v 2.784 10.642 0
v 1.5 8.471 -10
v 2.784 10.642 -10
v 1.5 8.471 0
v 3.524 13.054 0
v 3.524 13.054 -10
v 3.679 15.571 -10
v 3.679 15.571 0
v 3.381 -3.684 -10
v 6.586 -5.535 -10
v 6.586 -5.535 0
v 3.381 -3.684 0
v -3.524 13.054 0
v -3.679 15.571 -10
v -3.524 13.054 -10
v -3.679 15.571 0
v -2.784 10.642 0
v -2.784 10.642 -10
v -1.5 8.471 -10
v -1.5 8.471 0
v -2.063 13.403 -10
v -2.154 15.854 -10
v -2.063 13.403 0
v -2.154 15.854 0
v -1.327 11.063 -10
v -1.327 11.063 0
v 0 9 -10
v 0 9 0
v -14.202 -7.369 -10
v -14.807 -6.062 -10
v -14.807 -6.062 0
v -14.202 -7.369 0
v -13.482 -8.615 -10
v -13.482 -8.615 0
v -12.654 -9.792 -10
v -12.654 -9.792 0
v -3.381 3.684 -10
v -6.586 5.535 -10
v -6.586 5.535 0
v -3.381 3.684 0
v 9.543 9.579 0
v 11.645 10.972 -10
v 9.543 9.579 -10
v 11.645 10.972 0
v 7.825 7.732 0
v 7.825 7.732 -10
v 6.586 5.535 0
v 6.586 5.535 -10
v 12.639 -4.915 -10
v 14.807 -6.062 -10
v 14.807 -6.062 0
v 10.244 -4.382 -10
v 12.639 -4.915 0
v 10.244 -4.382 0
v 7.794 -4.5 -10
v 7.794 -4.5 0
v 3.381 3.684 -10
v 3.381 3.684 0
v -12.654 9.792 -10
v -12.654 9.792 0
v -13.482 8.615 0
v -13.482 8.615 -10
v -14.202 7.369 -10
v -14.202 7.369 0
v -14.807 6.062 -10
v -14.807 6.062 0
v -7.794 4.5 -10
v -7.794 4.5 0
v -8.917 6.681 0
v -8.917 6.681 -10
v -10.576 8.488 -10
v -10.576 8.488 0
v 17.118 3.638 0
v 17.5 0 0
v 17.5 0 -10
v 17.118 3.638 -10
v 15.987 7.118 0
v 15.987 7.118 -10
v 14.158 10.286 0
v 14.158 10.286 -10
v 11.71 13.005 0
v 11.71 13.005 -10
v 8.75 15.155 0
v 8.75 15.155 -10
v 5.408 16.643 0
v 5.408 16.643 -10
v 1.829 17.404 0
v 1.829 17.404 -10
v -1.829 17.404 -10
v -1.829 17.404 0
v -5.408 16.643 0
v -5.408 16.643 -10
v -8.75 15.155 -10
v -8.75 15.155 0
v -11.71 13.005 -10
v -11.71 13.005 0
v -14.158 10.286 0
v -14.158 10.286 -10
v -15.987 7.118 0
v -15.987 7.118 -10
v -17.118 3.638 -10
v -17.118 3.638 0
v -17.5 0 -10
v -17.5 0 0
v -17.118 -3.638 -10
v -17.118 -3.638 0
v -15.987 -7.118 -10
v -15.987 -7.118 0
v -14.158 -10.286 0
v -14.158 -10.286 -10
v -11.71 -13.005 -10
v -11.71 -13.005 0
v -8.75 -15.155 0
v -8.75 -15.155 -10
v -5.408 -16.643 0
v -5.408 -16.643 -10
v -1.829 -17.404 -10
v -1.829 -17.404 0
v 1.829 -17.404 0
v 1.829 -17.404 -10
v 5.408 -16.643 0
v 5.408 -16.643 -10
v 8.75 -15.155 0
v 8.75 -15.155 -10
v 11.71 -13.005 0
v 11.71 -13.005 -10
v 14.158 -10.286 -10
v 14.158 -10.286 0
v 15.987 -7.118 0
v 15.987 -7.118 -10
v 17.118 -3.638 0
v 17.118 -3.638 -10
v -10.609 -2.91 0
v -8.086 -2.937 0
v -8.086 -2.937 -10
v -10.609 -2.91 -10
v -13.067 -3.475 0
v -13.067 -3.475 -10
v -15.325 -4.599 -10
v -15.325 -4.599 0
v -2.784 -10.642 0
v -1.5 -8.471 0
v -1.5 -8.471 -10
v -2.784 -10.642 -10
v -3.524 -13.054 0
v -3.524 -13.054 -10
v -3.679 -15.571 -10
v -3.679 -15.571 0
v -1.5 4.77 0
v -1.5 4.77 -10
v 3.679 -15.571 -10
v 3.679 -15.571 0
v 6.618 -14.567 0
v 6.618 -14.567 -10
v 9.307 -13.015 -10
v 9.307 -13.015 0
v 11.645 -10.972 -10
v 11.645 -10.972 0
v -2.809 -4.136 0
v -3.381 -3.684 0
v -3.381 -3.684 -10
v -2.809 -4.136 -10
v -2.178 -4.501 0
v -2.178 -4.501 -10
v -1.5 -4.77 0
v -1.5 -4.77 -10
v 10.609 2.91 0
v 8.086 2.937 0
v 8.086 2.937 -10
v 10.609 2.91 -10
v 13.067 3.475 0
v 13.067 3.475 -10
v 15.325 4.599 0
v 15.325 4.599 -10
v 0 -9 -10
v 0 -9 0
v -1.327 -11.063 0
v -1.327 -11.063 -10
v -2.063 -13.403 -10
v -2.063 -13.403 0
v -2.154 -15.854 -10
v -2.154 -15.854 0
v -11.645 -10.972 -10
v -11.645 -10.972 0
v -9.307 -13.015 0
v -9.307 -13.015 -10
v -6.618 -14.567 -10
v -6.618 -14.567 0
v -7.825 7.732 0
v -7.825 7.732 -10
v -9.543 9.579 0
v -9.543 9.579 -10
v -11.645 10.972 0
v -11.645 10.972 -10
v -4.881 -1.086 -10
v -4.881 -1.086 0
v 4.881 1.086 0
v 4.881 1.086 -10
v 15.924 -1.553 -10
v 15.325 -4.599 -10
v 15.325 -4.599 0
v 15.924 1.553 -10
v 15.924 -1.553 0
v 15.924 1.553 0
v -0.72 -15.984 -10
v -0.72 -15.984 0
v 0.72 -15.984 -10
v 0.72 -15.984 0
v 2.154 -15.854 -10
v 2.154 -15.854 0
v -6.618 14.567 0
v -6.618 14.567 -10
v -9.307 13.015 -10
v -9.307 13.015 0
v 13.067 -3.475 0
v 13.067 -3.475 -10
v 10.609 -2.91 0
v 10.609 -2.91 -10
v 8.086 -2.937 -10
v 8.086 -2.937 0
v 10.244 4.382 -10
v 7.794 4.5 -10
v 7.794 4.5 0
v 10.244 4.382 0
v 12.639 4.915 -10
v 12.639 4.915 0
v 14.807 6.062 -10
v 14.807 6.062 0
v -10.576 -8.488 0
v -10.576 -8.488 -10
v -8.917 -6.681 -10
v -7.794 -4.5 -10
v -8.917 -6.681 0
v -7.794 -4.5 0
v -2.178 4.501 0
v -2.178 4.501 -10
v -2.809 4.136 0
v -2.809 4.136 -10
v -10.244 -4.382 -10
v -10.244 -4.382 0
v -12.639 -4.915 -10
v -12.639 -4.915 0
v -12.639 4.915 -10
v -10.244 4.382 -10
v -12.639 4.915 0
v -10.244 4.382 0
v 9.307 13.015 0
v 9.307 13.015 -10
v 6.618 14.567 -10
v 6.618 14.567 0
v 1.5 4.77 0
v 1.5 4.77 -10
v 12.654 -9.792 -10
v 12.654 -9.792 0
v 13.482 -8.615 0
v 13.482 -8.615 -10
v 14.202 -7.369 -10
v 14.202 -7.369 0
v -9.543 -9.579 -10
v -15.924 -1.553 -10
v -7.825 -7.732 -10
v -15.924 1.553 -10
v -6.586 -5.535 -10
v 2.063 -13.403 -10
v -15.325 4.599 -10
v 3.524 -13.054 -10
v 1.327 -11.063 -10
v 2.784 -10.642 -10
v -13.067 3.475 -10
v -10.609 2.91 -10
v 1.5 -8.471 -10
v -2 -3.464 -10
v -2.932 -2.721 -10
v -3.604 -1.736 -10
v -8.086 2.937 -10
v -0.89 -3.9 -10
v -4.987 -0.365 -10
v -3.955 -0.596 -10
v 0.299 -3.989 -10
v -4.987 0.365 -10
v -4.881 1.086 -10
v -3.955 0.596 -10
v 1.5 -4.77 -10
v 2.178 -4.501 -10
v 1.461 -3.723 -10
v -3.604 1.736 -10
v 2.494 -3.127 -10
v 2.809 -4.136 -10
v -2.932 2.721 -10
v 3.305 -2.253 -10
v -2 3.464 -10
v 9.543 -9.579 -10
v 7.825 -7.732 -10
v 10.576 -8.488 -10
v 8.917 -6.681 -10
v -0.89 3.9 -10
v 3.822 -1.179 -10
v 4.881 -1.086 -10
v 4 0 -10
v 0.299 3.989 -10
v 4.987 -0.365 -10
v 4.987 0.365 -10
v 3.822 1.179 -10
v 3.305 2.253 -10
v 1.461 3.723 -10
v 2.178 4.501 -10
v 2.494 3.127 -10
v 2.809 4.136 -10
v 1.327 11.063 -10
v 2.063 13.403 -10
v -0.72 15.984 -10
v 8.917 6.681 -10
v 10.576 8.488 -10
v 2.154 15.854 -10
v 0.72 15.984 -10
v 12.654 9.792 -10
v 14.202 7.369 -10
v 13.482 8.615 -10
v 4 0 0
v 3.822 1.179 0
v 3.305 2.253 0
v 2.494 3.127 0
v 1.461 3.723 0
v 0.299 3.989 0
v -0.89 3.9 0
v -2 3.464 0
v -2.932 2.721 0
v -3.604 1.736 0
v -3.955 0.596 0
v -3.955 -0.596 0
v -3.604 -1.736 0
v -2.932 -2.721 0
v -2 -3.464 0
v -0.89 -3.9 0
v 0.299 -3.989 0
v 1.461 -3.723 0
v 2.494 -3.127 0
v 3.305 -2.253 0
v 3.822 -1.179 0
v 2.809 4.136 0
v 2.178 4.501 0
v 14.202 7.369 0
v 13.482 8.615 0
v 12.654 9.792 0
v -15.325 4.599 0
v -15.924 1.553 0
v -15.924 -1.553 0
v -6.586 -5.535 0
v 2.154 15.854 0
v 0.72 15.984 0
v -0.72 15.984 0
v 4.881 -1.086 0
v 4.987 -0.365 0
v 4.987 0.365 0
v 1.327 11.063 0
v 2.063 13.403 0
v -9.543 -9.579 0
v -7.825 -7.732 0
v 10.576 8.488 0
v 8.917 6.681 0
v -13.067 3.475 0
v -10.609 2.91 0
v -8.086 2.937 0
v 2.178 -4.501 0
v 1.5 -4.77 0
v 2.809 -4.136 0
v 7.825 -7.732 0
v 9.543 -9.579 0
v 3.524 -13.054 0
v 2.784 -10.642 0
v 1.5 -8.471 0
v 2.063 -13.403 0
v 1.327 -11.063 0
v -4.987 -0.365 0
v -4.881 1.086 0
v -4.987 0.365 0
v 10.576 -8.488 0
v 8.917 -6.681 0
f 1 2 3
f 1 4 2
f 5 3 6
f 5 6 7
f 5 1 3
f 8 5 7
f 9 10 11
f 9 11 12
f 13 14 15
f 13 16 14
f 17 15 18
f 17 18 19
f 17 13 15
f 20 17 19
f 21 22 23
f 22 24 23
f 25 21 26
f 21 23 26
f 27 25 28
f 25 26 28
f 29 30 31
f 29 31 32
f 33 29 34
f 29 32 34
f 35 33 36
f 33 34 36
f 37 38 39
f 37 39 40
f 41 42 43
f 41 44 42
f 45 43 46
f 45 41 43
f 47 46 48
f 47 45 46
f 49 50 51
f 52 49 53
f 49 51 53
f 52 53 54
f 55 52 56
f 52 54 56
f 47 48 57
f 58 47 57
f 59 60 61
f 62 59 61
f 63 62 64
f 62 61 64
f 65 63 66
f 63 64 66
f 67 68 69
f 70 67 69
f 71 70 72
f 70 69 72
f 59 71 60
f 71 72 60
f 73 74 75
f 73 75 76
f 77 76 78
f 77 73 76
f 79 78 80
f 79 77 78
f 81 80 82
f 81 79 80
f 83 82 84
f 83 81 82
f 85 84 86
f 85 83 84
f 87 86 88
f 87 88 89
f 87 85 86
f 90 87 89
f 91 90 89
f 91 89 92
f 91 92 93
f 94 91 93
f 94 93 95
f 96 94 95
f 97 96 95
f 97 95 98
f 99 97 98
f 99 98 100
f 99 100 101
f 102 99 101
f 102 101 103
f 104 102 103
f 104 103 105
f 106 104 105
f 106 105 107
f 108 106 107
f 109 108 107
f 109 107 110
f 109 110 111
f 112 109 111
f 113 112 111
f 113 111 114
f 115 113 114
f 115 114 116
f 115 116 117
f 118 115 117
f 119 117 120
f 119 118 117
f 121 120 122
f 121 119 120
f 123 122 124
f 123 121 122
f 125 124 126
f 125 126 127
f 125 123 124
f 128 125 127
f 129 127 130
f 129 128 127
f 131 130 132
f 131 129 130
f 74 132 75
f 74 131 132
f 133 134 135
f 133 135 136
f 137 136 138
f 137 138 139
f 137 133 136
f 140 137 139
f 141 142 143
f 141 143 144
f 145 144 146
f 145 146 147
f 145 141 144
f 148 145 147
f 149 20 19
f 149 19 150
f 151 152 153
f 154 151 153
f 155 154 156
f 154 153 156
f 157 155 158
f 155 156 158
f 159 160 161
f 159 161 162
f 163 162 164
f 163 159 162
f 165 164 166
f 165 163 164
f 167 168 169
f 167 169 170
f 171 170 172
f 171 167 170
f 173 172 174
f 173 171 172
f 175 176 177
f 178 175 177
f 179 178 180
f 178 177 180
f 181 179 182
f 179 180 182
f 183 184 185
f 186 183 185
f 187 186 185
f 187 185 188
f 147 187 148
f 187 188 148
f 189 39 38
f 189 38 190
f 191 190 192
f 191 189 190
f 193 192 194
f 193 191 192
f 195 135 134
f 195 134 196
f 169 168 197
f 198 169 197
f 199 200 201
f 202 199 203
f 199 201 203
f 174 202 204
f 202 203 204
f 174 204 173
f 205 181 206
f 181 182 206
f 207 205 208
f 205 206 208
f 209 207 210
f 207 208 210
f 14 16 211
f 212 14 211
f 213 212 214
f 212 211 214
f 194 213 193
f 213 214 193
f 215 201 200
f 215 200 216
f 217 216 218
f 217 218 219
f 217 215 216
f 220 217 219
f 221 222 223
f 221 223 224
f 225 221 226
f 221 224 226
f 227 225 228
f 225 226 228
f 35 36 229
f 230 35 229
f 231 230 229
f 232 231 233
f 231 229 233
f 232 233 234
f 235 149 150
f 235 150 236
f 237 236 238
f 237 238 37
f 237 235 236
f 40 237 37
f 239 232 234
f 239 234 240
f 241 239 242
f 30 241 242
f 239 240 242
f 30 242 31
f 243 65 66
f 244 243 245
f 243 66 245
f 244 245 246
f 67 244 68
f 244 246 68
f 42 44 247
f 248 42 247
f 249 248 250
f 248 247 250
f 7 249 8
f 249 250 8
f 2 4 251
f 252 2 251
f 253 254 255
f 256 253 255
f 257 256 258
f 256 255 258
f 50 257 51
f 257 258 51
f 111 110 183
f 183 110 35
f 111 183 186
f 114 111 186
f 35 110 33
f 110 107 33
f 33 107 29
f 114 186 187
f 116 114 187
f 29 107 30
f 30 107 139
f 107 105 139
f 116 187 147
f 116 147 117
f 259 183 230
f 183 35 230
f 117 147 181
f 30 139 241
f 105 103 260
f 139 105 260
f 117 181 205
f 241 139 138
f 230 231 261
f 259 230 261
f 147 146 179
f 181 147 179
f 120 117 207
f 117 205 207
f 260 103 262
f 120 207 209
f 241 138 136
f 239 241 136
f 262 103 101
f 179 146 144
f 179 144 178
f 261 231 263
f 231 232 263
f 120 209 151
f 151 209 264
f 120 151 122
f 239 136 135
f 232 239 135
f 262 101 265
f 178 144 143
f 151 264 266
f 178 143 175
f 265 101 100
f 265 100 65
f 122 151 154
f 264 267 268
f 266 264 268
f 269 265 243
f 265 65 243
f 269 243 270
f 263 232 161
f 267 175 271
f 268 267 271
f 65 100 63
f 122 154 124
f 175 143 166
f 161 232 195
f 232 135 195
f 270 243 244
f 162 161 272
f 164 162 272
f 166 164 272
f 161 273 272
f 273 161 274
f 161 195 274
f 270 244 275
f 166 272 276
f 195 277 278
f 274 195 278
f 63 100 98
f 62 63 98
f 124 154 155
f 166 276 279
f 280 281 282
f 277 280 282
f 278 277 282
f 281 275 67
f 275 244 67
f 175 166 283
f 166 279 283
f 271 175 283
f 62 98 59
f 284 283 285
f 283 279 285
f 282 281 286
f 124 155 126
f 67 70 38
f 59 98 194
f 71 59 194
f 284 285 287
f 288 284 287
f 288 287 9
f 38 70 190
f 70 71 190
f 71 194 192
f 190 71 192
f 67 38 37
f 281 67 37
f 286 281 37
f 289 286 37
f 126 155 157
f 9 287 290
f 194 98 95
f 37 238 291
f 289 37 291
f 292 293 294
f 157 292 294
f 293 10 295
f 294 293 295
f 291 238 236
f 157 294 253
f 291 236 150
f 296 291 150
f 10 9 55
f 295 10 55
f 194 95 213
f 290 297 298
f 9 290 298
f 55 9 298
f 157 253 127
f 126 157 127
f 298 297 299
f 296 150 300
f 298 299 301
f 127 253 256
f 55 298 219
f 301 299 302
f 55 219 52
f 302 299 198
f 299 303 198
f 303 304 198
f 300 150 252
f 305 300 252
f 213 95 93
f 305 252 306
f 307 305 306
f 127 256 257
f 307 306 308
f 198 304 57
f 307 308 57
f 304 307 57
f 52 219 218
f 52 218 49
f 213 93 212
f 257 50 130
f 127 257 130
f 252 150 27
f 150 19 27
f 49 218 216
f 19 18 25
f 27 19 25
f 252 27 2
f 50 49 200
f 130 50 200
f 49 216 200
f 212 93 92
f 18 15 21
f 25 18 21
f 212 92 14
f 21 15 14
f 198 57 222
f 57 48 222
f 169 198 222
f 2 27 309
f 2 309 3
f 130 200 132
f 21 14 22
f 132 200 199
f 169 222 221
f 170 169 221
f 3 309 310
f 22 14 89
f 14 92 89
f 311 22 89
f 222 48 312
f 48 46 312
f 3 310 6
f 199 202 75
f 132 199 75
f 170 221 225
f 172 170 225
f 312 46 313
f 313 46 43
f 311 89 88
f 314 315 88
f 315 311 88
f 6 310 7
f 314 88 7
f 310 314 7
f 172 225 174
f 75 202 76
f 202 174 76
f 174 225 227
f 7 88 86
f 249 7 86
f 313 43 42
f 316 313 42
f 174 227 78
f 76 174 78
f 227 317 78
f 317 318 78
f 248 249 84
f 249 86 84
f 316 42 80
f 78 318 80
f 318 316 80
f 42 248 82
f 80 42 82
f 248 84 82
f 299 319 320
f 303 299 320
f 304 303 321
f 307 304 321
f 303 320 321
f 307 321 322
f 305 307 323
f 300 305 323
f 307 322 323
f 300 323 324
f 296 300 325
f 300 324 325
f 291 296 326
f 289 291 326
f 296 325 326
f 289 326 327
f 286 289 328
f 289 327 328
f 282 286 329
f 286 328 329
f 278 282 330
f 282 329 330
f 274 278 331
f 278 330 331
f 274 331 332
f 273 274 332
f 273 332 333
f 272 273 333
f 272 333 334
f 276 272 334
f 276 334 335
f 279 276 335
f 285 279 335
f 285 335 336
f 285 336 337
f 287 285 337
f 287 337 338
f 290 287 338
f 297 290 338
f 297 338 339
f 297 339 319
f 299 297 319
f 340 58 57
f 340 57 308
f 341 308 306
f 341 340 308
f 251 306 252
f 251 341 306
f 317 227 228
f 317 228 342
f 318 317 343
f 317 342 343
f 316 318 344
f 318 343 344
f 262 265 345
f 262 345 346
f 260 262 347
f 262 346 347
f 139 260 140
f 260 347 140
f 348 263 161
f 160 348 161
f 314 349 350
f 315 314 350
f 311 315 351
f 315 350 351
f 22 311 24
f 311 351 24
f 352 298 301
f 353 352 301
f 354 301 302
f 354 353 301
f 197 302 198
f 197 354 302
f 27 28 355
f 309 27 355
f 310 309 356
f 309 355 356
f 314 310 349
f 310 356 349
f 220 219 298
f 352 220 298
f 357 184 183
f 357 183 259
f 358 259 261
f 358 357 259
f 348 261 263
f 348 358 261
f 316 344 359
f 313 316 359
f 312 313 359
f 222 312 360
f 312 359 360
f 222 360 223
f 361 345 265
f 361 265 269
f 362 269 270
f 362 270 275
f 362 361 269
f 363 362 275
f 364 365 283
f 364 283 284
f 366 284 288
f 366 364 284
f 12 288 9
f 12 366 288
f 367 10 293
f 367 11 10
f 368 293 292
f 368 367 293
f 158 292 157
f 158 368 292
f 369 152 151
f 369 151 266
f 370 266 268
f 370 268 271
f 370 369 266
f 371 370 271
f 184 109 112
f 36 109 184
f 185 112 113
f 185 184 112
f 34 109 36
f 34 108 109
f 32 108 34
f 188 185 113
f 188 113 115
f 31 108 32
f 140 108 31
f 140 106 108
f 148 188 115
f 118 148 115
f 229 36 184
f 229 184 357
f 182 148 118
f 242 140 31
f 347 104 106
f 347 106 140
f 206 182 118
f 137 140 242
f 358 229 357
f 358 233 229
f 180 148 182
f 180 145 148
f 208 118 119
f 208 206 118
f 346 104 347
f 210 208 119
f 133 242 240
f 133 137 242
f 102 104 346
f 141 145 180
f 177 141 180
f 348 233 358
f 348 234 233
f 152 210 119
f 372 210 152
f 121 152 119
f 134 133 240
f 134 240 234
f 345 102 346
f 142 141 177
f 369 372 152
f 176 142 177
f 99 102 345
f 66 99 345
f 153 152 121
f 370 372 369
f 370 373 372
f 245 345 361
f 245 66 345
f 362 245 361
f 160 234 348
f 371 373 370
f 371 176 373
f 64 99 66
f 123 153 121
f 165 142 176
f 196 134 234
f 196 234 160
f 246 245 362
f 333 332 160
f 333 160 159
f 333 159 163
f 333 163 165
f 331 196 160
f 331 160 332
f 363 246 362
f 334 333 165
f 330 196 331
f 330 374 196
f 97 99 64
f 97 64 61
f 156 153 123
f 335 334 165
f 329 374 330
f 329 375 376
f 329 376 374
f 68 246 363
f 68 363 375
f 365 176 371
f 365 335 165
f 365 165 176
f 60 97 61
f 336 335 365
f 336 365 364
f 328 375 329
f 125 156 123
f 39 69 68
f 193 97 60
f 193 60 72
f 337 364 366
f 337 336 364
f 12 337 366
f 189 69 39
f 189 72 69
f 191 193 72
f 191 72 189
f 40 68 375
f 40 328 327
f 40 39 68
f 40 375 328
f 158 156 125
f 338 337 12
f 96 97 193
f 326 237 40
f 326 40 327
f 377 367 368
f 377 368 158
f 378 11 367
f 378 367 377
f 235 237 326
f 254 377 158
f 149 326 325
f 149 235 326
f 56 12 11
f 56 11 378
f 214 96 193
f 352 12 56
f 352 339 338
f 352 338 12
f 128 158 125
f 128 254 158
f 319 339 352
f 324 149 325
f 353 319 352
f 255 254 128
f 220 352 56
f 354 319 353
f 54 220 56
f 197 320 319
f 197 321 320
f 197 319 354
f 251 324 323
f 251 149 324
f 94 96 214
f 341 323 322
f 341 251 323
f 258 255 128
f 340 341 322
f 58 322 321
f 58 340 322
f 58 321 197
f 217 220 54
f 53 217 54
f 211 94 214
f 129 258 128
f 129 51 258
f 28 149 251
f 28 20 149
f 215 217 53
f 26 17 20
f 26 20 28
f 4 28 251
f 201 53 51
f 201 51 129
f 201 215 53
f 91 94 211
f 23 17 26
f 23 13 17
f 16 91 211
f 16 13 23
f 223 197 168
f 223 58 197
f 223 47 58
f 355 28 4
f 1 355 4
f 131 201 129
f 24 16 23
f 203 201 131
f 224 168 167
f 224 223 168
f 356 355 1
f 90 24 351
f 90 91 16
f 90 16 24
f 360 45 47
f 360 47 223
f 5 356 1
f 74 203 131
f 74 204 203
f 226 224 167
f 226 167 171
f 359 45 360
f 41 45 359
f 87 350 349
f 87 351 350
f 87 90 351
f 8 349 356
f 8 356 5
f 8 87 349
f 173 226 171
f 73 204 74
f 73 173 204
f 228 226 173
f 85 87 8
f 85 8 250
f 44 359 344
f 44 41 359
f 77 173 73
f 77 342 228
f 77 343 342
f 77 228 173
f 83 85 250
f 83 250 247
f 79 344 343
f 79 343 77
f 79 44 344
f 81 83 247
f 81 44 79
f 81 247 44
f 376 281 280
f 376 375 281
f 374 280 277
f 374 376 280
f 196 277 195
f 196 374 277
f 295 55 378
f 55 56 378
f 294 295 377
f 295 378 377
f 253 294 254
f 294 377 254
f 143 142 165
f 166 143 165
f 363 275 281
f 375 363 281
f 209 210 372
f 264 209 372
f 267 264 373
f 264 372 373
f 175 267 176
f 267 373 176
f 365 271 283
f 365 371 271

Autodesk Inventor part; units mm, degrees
ref_plane "YZ Plane" through (0, 0, 0) normal (1, 0, 0) x (0, 1, 0)
ref_plane "XZ Plane" through (0, 0, 0) normal (0, 1, 0) x (-1, 0, 0)
ref_plane "XY Plane" through (0, 0, 0) normal (0, 0, 1) x (1, 0, 0)
sketch "Sketch1" plane through (0, 0, 0) normal (0, 0, 1) x (1, 0, 0)
  circle A0 centre (0, 0) radius 17.5
  circle A1 centre (0, 0) radius 5
  line L0 (0, 5) -> (0, 9)
  arc A2 (0, 9) -> (1.8691, 17.3999) centre (-7.0076, 14.9672) ccw
  arc A3 (1.5, 8.4713) -> (3.471, 17.1523) centre (-7.0076, 14.9672) ccw
  line L1 (1.5, 8.4713) -> (1.5, 4.7697)
  arc A4 (-1.8691, 17.3999) -> (0, 9) centre (7.0076, 14.9672) ccw
  arc A5 (-3.471, 17.1523) -> (-1.5, 8.4713) centre (7.0076, 14.9672) ccw
  line L2 (-1.5, 8.4713) -> (-1.5, 4.7697)
  arc A6 (-6.5864, 5.5347) -> (-13.1189, 11.5821) centre (-16.4658, 1.4148) ccw
  arc A7 (-7.7942, 4.5) -> (-14.1342, 10.3186) centre (-16.4658, 1.4148) ccw
  line L3 (-6.5864, 5.5347) -> (-3.3807, 3.6839)
  line L4 (-4.3301, 2.5) -> (-7.7942, 4.5)
  line L5 (-8.0864, 2.9366) -> (-4.8807, 1.0858)
  arc A8 (-16.5898, 5.5702) -> (-8.0864, 2.9366) centre (-9.4581, 13.5524) ccw
  arc A9 (-16.0033, 7.0813) -> (-7.7942, 4.5) centre (-9.4581, 13.5524) ccw
  arc A10 (-8.0864, -2.9366) -> (-16.5898, -5.5702) centre (-9.4581, -13.5524) ccw
  arc A11 (-7.7942, -4.5) -> (-16.0033, -7.0813) centre (-9.4581, -13.5524) ccw
  line L6 (-8.0864, -2.9366) -> (-4.8807, -1.0858)
  line L7 (-4.3301, -2.5) -> (-7.7942, -4.5)
  line L8 (-6.5864, -5.5347) -> (-3.3807, -3.6839)
  arc A12 (-13.1189, -11.5821) -> (-6.5864, -5.5347) centre (-16.4658, -1.4148) ccw
  arc A13 (-14.1342, -10.3186) -> (-7.7942, -4.5) centre (-16.4658, -1.4148) ccw
  arc A14 (-1.5, -8.4713) -> (-3.471, -17.1523) centre (7.0076, -14.9672) ccw
  arc A15 (0, -9) -> (-1.8691, -17.3999) centre (7.0076, -14.9672) ccw
  line L9 (-1.5, -8.4713) -> (-1.5, -4.7697)
  line L10 (0, -5) -> (0, -9)
  line L11 (1.5, -8.4713) -> (1.5, -4.7697)
  arc A16 (3.471, -17.1523) -> (1.5, -8.4713) centre (-7.0076, -14.9672) ccw
  arc A17 (1.8691, -17.3999) -> (0, -9) centre (-7.0076, -14.9672) ccw
  arc A18 (6.5864, -5.5347) -> (13.1189, -11.5821) centre (16.4658, -1.4148) ccw
  arc A19 (7.7942, -4.5) -> (14.1342, -10.3186) centre (16.4658, -1.4148) ccw
  line L12 (6.5864, -5.5347) -> (3.3807, -3.6839)
  line L13 (4.3301, -2.5) -> (7.7942, -4.5)
  line L14 (8.0864, -2.9366) -> (4.8807, -1.0858)
  arc A20 (16.5898, -5.5702) -> (8.0864, -2.9366) centre (9.4581, -13.5524) ccw
  arc A21 (16.0033, -7.0813) -> (7.7942, -4.5) centre (9.4581, -13.5524) ccw
  arc A22 (8.0864, 2.9366) -> (16.5898, 5.5702) centre (9.4581, 13.5524) ccw
  arc A23 (7.7942, 4.5) -> (16.0033, 7.0813) centre (9.4581, 13.5524) ccw
  line L15 (8.0864, 2.9366) -> (4.8807, 1.0858)
  line L16 (4.3301, 2.5) -> (7.7942, 4.5)
  line L17 (6.5864, 5.5347) -> (3.3807, 3.6839)
  arc A24 (13.1189, 11.5821) -> (6.5864, 5.5347) centre (16.4658, 1.4148) ccw
  arc A25 (14.1342, 10.3186) -> (7.7942, 4.5) centre (16.4658, 1.4148) ccw
  circle A26 centre (0, 0) radius 4
  circle A27 centre (0, 0) radius 16
  point P0 (2.1535, 15.8544)
  point P1 (-2.1535, 15.8544)
  point P2 (15.3247, -4.5992)
  point P3 (15.3247, 4.5992)
  point P4 (3.6793, 15.5712)
  point P5 (11.6454, 10.972)
  point P6 (14.8071, 6.0622)
  point P7 (12.6536, 9.7922)
  point P8 (14.8071, -6.0622)
  point P9 (12.6536, -9.7922)
  point P10 (2.1535, -15.8544)
  point P11 (-2.1535, -15.8544)
  point P12 (11.6454, -10.972)
  point P13 (3.6793, -15.5712)
  point P14 (-3.6793, -15.5712)
  point P15 (-11.6454, -10.972)
  point P16 (-12.6536, -9.7922)
  point P17 (-14.8071, -6.0622)
  point P18 (-15.3247, -4.5992)
  point P19 (-15.3247, 4.5992)
  point P20 (-3.6793, 15.5712)
  point P21 (-11.6454, 10.972)
  point P22 (-14.8071, 6.0622)
  point P23 (-12.6536, 9.7922)
  dimension "d10" = 32
  dimension "d0" = 35
  dimension "d1" = 10
  dimension "d2" = 4
  dimension "d3" = 1.5
  dimension "d4" = 0
  dimension "d7" = 360
  dimension "d9" = 8
extrude "Extrusion1" add sketch "Sketch1" against normal blind 10 contours A0 A20 A27 A22 | A22 A27 A23 A0 | A0 A21 A27 A20 | A23 A27 A25 A0 | A22 L15 A1 L16 A23 A27 | A0 A19 A27 A21 | A27 A21 L13 A1 L14 A20 | A25 A27 A24 A0 | A0 A18 A27 A19 | A24 A27 A3 A0 | A25 L16 A1 L17 A24 A27 | A1 | A0 A16 A27 A18 | A27 A18 L12 A1 L13 A19 | A3 A27 A2 A0 | A0 A17 A27 A16 | A2 A27 A4 A0 | A3 L1 A1 L0 A2 A27 | A0 A15 A27 A17 | A27 A17 L10 A1 L11 A16 | A4 A27 A5 A0 | A0 A14 A27 A15 | A5 A27 A6 A0 | A4 L0 A1 L2 A5 A27 | A0 A12 A27 A14 | A27 A14 L9 A1 L10 A15 | A6 A27 A7 A0 | A0 A13 A27 A12 | A7 A27 A9 A0 | A6 L3 A1 L4 A7 A27 | A0 A11 A27 A13 | A27 A13 L7 A1 L8 A12 | A9 A27 A8 A0 | A1 L5 A8 A27 A9 L4 | A0 A10 A27 A11 | L7 A11 A27 A10 L6 A1 | A8 A27 A10 A0
properties part number "kumandaiç"
